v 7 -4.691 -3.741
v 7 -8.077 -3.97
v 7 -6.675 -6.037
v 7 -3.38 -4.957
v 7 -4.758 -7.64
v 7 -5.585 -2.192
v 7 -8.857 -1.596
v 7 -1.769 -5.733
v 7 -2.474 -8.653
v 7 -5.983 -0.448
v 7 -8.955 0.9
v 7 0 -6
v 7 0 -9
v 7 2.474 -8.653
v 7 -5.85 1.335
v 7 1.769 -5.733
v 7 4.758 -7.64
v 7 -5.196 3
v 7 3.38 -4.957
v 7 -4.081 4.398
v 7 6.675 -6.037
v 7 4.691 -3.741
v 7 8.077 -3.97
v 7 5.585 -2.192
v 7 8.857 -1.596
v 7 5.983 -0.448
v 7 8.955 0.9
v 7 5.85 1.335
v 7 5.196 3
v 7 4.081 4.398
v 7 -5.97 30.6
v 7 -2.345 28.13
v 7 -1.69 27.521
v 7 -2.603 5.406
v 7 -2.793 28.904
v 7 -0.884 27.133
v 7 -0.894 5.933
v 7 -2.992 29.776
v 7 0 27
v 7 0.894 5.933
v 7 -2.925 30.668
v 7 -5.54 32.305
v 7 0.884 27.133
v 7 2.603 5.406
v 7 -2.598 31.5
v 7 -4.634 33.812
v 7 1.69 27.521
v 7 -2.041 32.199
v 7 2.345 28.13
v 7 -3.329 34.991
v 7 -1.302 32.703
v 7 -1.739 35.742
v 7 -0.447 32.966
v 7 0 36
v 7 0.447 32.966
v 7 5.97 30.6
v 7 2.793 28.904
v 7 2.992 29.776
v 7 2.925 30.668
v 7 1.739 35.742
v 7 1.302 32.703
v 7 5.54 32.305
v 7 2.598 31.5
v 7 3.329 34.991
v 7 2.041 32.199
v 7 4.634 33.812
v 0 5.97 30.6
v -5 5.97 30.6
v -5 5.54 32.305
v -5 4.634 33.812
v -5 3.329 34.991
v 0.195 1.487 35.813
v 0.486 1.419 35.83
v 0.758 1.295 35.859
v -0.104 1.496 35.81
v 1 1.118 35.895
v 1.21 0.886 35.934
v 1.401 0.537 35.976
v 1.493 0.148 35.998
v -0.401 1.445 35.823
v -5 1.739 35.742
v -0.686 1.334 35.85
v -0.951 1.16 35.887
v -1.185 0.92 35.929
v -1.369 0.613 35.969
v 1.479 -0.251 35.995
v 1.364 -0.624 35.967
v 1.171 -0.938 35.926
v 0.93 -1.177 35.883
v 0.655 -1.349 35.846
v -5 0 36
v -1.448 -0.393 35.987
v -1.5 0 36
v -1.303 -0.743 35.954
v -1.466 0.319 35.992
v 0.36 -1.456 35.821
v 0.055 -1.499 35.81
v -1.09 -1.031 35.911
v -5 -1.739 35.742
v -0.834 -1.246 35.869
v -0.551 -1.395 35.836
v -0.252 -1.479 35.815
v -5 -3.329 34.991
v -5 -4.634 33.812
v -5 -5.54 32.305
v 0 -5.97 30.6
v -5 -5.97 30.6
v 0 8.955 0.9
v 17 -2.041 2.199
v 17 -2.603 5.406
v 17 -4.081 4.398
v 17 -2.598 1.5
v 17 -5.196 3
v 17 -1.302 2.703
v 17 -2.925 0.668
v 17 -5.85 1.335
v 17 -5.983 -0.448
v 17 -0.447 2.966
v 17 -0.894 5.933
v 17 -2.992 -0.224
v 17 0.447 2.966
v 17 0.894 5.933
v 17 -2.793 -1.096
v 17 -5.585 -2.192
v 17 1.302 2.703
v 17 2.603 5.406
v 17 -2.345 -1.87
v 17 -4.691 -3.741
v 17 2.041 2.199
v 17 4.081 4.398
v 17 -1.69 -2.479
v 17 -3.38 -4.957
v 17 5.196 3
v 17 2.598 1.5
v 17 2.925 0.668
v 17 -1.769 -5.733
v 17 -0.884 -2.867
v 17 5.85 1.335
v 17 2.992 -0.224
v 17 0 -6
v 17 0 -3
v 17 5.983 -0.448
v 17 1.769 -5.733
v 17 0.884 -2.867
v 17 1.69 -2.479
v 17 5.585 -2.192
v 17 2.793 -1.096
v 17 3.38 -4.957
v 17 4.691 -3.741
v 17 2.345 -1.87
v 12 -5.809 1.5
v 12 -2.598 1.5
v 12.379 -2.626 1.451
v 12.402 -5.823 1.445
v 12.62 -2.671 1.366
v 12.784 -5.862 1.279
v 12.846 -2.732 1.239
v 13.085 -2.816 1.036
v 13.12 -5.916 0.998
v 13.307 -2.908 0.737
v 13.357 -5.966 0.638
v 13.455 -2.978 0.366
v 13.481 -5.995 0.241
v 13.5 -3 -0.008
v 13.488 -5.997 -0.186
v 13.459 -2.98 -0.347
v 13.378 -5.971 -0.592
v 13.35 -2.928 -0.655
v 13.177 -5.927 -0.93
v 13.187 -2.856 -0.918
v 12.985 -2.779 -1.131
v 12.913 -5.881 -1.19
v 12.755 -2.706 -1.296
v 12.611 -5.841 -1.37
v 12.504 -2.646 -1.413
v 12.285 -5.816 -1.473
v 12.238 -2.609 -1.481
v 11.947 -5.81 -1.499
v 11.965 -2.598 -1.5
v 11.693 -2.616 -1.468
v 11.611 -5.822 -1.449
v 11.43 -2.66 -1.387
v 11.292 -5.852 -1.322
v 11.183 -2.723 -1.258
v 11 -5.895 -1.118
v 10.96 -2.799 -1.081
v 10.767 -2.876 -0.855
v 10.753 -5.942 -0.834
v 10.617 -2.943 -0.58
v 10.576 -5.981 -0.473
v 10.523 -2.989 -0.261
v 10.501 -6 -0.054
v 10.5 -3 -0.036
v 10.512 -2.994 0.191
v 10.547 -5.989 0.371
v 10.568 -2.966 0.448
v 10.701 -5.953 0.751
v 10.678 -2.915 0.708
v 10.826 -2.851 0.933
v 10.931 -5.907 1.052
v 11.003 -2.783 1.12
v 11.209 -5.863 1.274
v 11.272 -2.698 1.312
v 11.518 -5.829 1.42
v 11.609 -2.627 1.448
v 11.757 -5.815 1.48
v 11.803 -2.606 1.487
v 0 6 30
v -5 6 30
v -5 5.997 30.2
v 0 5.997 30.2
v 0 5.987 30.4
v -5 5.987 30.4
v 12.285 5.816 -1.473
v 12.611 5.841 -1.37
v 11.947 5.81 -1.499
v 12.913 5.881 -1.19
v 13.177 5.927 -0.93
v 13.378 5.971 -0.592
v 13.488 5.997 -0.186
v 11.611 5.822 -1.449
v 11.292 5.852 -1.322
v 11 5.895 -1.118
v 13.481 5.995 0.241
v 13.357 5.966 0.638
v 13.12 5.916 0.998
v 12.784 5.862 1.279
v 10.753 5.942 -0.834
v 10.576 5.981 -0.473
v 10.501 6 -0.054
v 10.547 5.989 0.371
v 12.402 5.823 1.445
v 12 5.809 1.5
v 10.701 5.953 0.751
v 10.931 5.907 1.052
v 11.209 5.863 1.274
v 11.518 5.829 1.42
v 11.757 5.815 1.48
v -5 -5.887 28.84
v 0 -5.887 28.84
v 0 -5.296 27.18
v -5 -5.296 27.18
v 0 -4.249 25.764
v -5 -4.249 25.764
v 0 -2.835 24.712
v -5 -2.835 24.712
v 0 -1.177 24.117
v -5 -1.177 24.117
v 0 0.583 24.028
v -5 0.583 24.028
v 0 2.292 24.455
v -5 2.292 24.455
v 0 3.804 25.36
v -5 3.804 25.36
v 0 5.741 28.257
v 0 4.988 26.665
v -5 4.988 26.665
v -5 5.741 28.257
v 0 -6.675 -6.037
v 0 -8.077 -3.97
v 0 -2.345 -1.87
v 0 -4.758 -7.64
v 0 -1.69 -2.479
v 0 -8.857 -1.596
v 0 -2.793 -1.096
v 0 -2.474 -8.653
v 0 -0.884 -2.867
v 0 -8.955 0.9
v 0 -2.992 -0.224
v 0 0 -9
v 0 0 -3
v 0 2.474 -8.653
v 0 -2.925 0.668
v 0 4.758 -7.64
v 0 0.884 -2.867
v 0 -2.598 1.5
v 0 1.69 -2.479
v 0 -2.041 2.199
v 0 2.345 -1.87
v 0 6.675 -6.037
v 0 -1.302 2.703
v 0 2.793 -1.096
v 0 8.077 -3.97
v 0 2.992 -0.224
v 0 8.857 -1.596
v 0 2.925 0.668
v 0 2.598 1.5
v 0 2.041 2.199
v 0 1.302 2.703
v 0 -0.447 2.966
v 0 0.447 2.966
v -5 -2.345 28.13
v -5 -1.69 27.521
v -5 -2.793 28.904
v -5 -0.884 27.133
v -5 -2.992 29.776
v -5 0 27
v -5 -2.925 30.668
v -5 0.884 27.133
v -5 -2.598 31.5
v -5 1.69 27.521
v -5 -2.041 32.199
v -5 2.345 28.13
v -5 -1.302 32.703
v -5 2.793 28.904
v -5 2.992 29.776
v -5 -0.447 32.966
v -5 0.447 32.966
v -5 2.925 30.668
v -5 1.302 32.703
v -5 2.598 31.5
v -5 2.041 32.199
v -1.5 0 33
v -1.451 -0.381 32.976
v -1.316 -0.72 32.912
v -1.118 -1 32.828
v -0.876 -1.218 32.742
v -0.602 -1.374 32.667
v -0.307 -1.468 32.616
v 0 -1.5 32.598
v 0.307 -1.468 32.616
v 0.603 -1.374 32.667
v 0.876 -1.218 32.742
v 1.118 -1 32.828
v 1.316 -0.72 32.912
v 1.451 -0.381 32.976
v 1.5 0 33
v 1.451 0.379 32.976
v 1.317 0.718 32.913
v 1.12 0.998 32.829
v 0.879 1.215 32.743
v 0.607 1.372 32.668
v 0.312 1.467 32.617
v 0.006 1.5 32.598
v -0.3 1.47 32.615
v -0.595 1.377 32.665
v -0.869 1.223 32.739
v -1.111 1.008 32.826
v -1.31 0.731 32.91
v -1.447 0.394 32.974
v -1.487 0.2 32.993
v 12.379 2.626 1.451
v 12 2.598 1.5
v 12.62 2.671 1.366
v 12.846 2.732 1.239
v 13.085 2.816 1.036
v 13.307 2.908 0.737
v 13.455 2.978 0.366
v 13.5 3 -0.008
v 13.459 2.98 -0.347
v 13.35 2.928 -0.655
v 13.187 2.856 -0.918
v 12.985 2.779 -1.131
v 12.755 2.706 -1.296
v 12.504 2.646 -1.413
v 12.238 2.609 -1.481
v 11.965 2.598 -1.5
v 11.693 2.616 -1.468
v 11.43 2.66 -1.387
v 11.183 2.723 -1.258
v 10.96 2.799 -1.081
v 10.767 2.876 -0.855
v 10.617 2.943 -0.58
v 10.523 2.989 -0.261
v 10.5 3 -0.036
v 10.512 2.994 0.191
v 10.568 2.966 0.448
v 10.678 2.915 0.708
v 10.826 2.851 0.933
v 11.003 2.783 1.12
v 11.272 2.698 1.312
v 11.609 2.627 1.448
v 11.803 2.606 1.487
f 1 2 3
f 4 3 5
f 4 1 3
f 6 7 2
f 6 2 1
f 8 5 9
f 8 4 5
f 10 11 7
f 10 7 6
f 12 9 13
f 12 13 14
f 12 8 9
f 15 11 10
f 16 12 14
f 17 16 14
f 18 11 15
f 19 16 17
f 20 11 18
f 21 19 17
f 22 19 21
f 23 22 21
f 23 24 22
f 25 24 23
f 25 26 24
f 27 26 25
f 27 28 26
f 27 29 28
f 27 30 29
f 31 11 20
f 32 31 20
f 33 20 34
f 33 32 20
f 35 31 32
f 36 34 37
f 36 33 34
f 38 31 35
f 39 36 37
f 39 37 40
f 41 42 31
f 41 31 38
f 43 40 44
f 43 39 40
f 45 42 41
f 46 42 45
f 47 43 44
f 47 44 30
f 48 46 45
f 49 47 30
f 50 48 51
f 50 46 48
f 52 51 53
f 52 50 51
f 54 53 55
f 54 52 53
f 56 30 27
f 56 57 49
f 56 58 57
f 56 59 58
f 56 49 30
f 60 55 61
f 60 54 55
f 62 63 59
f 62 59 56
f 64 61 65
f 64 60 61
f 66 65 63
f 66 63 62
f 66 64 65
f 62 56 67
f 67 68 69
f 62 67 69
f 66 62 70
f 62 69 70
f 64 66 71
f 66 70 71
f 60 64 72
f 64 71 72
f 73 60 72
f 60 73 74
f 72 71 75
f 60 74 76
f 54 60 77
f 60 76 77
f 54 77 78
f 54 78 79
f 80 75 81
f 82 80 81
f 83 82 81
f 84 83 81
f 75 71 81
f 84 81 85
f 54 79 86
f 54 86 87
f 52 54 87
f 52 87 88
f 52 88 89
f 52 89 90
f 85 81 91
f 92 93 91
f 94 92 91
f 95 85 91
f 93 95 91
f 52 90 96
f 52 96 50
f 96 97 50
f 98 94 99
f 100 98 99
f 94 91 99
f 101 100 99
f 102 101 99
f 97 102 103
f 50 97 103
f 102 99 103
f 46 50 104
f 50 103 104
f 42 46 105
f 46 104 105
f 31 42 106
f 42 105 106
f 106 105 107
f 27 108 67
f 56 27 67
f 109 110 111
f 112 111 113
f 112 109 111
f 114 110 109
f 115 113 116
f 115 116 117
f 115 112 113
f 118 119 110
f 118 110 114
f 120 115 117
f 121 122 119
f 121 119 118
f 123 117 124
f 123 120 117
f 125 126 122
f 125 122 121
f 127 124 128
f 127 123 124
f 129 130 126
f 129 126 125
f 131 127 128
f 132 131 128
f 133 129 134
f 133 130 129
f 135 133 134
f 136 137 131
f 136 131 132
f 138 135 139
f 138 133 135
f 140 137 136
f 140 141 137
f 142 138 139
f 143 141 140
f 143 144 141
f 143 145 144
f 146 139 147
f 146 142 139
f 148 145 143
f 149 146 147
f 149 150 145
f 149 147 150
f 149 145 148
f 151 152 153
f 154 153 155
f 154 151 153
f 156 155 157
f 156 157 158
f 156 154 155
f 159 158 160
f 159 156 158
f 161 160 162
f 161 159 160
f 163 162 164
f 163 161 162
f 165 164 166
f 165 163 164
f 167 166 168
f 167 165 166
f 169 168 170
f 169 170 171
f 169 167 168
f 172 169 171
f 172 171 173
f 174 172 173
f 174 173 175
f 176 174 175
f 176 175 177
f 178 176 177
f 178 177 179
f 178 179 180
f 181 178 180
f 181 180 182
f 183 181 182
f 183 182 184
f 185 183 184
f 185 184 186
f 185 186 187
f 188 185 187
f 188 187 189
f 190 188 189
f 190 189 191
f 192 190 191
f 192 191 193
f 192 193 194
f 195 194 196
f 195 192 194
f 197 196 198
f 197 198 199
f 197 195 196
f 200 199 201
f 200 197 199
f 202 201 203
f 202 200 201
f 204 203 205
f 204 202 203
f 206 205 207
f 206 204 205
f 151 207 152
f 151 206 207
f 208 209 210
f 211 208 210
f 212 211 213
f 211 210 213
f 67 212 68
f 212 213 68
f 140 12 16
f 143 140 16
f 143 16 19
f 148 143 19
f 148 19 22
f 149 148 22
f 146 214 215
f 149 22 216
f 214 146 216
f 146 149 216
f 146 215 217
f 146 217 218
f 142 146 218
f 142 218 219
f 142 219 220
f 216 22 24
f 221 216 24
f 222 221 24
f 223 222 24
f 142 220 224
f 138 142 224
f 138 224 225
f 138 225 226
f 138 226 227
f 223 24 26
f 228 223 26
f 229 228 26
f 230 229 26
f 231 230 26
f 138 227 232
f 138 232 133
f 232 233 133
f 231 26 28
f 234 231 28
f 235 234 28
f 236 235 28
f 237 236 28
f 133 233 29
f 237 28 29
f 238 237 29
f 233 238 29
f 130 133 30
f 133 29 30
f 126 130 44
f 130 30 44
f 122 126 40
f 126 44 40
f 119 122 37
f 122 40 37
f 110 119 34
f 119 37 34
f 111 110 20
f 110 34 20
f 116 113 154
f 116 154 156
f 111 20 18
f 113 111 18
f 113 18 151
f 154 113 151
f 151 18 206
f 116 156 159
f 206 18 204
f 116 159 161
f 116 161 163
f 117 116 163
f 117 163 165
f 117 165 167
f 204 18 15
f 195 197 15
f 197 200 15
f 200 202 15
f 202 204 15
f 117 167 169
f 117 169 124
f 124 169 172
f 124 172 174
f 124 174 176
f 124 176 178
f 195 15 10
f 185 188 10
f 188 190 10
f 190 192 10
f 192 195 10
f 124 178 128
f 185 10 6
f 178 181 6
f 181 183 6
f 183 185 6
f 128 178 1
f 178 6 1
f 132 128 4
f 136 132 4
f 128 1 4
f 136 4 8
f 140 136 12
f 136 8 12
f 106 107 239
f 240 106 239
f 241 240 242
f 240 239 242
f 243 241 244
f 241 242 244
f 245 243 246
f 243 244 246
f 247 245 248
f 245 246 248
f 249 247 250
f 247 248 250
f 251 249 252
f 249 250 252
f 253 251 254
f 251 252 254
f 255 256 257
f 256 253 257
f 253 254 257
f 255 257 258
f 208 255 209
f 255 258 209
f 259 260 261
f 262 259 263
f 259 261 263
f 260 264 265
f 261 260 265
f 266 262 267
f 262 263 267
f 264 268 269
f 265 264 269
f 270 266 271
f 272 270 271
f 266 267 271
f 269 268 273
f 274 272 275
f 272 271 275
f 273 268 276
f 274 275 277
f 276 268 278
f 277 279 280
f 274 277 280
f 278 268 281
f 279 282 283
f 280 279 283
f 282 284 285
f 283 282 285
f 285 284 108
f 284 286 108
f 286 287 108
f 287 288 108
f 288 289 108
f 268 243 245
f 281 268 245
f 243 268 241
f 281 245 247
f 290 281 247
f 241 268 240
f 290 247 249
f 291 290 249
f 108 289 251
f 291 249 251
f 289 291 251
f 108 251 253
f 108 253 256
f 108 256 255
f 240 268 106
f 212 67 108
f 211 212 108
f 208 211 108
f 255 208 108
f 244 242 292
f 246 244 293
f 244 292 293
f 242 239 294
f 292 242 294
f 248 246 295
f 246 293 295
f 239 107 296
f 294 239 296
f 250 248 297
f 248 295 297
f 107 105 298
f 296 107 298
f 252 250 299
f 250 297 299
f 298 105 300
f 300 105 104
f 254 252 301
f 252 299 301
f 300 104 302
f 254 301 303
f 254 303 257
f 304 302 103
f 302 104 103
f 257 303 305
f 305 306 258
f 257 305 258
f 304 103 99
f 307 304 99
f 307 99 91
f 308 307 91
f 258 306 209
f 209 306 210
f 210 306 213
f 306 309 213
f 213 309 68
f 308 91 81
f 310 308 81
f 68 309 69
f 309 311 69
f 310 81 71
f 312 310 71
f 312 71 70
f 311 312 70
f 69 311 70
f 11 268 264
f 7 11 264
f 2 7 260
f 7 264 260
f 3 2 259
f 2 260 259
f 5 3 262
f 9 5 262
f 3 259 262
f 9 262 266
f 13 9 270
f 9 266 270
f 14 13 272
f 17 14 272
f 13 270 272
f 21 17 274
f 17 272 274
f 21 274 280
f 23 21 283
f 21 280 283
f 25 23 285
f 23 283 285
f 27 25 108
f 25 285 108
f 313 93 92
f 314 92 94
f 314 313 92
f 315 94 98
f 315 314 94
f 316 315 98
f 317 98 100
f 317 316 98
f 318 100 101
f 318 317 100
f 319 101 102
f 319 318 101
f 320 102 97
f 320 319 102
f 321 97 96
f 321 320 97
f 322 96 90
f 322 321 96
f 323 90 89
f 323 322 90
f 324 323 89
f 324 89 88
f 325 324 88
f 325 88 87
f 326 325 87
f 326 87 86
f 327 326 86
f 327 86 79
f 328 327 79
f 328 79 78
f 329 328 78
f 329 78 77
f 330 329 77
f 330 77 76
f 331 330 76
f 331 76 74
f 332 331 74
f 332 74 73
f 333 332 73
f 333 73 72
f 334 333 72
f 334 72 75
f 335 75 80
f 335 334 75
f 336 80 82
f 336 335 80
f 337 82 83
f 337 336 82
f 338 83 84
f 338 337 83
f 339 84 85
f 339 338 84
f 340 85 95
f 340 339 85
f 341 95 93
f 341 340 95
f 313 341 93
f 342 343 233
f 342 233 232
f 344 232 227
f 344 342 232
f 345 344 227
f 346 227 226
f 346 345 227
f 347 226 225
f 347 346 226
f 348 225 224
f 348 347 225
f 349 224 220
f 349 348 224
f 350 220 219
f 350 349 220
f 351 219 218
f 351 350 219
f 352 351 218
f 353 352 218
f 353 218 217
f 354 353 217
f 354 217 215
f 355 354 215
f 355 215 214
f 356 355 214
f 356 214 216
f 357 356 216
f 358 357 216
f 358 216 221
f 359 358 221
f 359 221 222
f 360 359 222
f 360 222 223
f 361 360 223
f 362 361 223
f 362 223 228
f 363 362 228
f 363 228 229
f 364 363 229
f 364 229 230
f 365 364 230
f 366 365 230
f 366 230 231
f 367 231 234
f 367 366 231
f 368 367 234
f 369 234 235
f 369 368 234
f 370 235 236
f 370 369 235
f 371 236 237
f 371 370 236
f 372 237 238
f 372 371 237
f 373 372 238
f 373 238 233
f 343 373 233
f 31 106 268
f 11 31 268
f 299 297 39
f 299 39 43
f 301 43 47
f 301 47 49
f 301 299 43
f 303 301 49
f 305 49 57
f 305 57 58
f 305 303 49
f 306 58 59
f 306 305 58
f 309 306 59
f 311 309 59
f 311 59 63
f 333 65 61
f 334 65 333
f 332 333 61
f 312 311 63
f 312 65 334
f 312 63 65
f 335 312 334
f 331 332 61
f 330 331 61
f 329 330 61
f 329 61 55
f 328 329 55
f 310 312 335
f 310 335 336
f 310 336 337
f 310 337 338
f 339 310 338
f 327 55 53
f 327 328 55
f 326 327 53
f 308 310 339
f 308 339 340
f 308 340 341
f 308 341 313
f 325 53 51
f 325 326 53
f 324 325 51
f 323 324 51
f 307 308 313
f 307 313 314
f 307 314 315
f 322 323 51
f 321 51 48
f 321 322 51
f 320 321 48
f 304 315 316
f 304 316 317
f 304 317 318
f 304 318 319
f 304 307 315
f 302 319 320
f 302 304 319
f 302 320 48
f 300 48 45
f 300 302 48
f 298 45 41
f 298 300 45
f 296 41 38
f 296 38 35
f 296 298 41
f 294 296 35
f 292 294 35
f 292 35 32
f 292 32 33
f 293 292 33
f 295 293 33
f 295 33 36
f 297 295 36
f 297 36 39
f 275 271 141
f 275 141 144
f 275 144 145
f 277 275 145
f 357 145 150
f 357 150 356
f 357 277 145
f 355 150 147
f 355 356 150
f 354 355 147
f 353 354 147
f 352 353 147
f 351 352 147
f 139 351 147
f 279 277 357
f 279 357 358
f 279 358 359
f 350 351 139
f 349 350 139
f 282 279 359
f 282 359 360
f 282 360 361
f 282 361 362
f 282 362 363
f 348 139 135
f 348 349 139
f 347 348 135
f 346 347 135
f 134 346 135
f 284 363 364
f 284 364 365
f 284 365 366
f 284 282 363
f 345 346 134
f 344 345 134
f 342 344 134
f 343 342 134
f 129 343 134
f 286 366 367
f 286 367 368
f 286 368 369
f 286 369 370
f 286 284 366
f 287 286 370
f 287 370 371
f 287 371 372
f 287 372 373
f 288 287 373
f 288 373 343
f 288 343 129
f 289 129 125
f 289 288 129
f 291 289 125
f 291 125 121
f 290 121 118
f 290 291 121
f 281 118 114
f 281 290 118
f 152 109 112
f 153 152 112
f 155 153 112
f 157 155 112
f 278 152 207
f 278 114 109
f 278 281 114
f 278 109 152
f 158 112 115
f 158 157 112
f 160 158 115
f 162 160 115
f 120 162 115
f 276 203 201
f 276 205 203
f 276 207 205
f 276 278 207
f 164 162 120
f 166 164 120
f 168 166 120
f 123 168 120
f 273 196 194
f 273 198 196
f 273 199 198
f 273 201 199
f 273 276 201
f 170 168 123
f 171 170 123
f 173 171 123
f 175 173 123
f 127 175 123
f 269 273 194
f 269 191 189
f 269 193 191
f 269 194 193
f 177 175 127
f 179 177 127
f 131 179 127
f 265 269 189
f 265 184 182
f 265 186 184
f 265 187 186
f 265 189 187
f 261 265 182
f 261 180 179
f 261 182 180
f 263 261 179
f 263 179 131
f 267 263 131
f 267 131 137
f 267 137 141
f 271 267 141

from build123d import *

# Parameters (mm, degrees)
SKETCH1_R               = 3
BOSS_EXTRUDE1_DEPTH     = 7
BOSS_EXTRUDE2_START     = -12
SKETCH2_R               = 3
BOSS_EXTRUDE2_DEPTH     = 12
SKETCH2_4_R             = 6
SKETCH2_4_R_2           = 3
BOSS_EXTRUDE3_DEPTH     = 10
CUT_EXTRUDE1_DEPTH      = 41.816663264
CUT_EXTRUDE1_DEPTH_BACK = 41.816663264
SKETCH4_R               = 1.5
SKETCH6_R               = 1.5
CUT_EXTRUDE2_DEPTH      = 44.485629849


with BuildPart() as part:
    # Sketch1 → Boss-Extrude1 (new body)
    with BuildSketch(Plane.YZ):
        with BuildLine():
            Line((-5.969924623, 30.6), (-8.954886934, 0.9))
            ThreePointArc((-8.954886934, 0.9), (0, -9), (8.954886934, 0.9))
            Line((8.954886934, 0.9), (5.969924623, 30.6))
            ThreePointArc((5.969924623, 30.6), (0, 36), (-5.969924623, 30.6))
        make_face()
        Circle(SKETCH1_R, mode=Mode.SUBTRACT)
        with Locations((0, 30)):
            Circle(SKETCH1_R, mode=Mode.SUBTRACT)
    extrude(amount=BOSS_EXTRUDE1_DEPTH)

    # Sketch2 → Boss-Extrude2 (add)
    with BuildSketch(Plane.YZ.offset(7).offset(BOSS_EXTRUDE2_START)):
        with BuildLine():
            ThreePointArc((-5.969924623, 30.6), (-0.30037665, 24.007523561), (6, 30))
            ThreePointArc((6, 30), (5.992476439, 30.30037665), (5.969924623, 30.6))
            ThreePointArc((5.969924623, 30.6), (0, 36), (-5.969924623, 30.6))
        make_face()
        with Locations((0, 30)):
            Circle(SKETCH2_R, mode=Mode.SUBTRACT)
    extrude(amount=BOSS_EXTRUDE2_DEPTH)

    # Sketch2<4> → Boss-Extrude3 (add)
    with BuildSketch(Plane.YZ.offset(7)):
        Circle(SKETCH2_4_R)
        Circle(SKETCH2_4_R_2, mode=Mode.SUBTRACT)
    extrude(amount=BOSS_EXTRUDE3_DEPTH)

    # Sketch4 → Cut-Extrude1 (cut, two sides: drawn at the far end of the back side and taken through both)
    with BuildSketch(Plane(origin=(0, 0, 0), x_dir=(-1, 0, 0), z_dir=(0, 1, 0)).offset(-CUT_EXTRUDE1_DEPTH_BACK)):
        with Locations((-12, 0)):
            Circle(SKETCH4_R)
    extrude(amount=CUT_EXTRUDE1_DEPTH + CUT_EXTRUDE1_DEPTH_BACK, mode=Mode.SUBTRACT)

    # Sketch6 → Cut-Extrude2 (cut, through all)
    with BuildSketch(Plane(origin=(0, 0, 30), x_dir=(0, 1, 0), z_dir=(0, 0, 1))):
        Circle(SKETCH6_R)
    extrude(amount=CUT_EXTRUDE2_DEPTH, mode=Mode.SUBTRACT)


solid = part.part
